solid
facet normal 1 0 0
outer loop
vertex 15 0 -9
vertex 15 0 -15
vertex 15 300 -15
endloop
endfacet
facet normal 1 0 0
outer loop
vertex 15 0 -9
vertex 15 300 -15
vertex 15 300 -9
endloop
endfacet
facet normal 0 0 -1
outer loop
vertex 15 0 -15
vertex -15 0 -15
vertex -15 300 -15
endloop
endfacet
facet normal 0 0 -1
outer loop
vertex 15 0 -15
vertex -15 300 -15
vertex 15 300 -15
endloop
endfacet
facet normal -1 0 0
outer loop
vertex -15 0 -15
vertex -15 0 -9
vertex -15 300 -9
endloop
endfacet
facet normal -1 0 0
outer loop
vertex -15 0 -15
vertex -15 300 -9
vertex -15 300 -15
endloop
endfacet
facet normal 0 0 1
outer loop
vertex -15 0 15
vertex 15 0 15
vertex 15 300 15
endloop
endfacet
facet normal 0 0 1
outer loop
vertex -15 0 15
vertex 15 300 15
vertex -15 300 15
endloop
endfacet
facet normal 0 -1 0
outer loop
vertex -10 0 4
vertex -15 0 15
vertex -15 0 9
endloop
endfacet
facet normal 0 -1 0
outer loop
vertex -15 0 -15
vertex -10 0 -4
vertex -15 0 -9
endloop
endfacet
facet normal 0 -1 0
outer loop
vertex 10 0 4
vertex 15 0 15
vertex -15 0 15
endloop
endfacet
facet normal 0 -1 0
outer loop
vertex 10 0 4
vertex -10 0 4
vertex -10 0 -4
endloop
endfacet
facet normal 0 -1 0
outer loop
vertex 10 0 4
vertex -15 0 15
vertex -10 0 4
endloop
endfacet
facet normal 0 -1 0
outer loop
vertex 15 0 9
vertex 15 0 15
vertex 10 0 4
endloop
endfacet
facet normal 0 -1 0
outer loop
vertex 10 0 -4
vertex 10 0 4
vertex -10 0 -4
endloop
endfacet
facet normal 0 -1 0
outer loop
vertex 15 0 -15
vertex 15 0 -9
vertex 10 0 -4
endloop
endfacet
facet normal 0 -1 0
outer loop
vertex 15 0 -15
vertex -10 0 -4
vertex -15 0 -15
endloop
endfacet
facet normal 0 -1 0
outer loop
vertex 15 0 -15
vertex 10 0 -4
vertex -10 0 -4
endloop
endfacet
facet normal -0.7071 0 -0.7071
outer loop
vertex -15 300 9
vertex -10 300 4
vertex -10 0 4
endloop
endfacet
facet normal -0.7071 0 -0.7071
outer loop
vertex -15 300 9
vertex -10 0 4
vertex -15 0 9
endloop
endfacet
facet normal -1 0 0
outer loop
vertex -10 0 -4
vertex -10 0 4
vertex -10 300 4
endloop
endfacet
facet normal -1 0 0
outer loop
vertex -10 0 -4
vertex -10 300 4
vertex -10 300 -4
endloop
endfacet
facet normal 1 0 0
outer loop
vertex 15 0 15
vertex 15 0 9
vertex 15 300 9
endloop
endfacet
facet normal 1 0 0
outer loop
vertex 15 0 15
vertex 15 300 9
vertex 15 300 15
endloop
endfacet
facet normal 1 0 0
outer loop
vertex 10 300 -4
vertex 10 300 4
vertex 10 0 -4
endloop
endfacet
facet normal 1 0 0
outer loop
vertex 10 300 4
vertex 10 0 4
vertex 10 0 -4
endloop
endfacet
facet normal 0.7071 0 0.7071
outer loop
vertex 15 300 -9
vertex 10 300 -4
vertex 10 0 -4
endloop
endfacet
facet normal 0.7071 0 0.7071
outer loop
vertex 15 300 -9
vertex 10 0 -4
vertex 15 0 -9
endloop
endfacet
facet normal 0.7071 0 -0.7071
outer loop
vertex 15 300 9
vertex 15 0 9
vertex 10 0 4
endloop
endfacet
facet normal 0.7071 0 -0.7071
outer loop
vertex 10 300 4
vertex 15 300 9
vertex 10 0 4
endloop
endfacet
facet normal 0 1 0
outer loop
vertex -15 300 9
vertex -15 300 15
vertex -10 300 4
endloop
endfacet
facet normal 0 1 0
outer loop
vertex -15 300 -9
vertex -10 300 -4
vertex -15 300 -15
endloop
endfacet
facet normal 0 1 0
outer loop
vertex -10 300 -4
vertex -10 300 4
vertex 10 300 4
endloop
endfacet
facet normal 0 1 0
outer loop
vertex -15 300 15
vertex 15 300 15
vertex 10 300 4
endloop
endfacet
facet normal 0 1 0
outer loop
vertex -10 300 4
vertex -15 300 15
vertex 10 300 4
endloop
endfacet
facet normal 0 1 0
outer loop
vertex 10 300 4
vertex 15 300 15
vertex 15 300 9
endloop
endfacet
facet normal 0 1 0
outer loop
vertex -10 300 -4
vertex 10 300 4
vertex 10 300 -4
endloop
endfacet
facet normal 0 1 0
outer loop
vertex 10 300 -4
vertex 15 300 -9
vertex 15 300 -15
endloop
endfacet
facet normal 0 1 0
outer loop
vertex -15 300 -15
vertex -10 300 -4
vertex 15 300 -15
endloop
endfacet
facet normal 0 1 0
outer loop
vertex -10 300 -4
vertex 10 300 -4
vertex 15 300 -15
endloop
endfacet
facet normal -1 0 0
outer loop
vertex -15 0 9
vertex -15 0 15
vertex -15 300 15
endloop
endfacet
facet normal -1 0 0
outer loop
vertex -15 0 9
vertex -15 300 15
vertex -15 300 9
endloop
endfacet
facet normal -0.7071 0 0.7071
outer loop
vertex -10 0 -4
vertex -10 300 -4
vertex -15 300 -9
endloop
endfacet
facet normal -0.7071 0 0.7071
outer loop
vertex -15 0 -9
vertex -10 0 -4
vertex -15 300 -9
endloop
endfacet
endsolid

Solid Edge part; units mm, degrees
sketch "Sketch1" plane through (0, 0, 0) normal (0, -1, 0) x (1, 0, 0)
  line L0 (-15, -15) -> (15, -15)
  line L1 (15, -15) -> (15, -9)
  line L2 (10, -4) -> (15, -9)
  line L3 (10, 4) -> (10, -4)
  line L4 (15, 9) -> (10, 4)
  line L5 (15, 9) -> (15, 15)
  line L6 (15, 15) -> (-15, 15)
  line L7 (-15, 15) -> (-15, 9)
  line L8 (-10, 4) -> (-15, 9)
  line L9 (-10, 4) -> (-10, -4)
  line L10 (-10, -4) -> (-15, -9)
  line L11 (-15, -9) -> (-15, -15)
  dimension "D1" = 5
  dimension "D2" = 4
extrude "Protrusion1" add sketch "Sketch1" against normal blind 300
